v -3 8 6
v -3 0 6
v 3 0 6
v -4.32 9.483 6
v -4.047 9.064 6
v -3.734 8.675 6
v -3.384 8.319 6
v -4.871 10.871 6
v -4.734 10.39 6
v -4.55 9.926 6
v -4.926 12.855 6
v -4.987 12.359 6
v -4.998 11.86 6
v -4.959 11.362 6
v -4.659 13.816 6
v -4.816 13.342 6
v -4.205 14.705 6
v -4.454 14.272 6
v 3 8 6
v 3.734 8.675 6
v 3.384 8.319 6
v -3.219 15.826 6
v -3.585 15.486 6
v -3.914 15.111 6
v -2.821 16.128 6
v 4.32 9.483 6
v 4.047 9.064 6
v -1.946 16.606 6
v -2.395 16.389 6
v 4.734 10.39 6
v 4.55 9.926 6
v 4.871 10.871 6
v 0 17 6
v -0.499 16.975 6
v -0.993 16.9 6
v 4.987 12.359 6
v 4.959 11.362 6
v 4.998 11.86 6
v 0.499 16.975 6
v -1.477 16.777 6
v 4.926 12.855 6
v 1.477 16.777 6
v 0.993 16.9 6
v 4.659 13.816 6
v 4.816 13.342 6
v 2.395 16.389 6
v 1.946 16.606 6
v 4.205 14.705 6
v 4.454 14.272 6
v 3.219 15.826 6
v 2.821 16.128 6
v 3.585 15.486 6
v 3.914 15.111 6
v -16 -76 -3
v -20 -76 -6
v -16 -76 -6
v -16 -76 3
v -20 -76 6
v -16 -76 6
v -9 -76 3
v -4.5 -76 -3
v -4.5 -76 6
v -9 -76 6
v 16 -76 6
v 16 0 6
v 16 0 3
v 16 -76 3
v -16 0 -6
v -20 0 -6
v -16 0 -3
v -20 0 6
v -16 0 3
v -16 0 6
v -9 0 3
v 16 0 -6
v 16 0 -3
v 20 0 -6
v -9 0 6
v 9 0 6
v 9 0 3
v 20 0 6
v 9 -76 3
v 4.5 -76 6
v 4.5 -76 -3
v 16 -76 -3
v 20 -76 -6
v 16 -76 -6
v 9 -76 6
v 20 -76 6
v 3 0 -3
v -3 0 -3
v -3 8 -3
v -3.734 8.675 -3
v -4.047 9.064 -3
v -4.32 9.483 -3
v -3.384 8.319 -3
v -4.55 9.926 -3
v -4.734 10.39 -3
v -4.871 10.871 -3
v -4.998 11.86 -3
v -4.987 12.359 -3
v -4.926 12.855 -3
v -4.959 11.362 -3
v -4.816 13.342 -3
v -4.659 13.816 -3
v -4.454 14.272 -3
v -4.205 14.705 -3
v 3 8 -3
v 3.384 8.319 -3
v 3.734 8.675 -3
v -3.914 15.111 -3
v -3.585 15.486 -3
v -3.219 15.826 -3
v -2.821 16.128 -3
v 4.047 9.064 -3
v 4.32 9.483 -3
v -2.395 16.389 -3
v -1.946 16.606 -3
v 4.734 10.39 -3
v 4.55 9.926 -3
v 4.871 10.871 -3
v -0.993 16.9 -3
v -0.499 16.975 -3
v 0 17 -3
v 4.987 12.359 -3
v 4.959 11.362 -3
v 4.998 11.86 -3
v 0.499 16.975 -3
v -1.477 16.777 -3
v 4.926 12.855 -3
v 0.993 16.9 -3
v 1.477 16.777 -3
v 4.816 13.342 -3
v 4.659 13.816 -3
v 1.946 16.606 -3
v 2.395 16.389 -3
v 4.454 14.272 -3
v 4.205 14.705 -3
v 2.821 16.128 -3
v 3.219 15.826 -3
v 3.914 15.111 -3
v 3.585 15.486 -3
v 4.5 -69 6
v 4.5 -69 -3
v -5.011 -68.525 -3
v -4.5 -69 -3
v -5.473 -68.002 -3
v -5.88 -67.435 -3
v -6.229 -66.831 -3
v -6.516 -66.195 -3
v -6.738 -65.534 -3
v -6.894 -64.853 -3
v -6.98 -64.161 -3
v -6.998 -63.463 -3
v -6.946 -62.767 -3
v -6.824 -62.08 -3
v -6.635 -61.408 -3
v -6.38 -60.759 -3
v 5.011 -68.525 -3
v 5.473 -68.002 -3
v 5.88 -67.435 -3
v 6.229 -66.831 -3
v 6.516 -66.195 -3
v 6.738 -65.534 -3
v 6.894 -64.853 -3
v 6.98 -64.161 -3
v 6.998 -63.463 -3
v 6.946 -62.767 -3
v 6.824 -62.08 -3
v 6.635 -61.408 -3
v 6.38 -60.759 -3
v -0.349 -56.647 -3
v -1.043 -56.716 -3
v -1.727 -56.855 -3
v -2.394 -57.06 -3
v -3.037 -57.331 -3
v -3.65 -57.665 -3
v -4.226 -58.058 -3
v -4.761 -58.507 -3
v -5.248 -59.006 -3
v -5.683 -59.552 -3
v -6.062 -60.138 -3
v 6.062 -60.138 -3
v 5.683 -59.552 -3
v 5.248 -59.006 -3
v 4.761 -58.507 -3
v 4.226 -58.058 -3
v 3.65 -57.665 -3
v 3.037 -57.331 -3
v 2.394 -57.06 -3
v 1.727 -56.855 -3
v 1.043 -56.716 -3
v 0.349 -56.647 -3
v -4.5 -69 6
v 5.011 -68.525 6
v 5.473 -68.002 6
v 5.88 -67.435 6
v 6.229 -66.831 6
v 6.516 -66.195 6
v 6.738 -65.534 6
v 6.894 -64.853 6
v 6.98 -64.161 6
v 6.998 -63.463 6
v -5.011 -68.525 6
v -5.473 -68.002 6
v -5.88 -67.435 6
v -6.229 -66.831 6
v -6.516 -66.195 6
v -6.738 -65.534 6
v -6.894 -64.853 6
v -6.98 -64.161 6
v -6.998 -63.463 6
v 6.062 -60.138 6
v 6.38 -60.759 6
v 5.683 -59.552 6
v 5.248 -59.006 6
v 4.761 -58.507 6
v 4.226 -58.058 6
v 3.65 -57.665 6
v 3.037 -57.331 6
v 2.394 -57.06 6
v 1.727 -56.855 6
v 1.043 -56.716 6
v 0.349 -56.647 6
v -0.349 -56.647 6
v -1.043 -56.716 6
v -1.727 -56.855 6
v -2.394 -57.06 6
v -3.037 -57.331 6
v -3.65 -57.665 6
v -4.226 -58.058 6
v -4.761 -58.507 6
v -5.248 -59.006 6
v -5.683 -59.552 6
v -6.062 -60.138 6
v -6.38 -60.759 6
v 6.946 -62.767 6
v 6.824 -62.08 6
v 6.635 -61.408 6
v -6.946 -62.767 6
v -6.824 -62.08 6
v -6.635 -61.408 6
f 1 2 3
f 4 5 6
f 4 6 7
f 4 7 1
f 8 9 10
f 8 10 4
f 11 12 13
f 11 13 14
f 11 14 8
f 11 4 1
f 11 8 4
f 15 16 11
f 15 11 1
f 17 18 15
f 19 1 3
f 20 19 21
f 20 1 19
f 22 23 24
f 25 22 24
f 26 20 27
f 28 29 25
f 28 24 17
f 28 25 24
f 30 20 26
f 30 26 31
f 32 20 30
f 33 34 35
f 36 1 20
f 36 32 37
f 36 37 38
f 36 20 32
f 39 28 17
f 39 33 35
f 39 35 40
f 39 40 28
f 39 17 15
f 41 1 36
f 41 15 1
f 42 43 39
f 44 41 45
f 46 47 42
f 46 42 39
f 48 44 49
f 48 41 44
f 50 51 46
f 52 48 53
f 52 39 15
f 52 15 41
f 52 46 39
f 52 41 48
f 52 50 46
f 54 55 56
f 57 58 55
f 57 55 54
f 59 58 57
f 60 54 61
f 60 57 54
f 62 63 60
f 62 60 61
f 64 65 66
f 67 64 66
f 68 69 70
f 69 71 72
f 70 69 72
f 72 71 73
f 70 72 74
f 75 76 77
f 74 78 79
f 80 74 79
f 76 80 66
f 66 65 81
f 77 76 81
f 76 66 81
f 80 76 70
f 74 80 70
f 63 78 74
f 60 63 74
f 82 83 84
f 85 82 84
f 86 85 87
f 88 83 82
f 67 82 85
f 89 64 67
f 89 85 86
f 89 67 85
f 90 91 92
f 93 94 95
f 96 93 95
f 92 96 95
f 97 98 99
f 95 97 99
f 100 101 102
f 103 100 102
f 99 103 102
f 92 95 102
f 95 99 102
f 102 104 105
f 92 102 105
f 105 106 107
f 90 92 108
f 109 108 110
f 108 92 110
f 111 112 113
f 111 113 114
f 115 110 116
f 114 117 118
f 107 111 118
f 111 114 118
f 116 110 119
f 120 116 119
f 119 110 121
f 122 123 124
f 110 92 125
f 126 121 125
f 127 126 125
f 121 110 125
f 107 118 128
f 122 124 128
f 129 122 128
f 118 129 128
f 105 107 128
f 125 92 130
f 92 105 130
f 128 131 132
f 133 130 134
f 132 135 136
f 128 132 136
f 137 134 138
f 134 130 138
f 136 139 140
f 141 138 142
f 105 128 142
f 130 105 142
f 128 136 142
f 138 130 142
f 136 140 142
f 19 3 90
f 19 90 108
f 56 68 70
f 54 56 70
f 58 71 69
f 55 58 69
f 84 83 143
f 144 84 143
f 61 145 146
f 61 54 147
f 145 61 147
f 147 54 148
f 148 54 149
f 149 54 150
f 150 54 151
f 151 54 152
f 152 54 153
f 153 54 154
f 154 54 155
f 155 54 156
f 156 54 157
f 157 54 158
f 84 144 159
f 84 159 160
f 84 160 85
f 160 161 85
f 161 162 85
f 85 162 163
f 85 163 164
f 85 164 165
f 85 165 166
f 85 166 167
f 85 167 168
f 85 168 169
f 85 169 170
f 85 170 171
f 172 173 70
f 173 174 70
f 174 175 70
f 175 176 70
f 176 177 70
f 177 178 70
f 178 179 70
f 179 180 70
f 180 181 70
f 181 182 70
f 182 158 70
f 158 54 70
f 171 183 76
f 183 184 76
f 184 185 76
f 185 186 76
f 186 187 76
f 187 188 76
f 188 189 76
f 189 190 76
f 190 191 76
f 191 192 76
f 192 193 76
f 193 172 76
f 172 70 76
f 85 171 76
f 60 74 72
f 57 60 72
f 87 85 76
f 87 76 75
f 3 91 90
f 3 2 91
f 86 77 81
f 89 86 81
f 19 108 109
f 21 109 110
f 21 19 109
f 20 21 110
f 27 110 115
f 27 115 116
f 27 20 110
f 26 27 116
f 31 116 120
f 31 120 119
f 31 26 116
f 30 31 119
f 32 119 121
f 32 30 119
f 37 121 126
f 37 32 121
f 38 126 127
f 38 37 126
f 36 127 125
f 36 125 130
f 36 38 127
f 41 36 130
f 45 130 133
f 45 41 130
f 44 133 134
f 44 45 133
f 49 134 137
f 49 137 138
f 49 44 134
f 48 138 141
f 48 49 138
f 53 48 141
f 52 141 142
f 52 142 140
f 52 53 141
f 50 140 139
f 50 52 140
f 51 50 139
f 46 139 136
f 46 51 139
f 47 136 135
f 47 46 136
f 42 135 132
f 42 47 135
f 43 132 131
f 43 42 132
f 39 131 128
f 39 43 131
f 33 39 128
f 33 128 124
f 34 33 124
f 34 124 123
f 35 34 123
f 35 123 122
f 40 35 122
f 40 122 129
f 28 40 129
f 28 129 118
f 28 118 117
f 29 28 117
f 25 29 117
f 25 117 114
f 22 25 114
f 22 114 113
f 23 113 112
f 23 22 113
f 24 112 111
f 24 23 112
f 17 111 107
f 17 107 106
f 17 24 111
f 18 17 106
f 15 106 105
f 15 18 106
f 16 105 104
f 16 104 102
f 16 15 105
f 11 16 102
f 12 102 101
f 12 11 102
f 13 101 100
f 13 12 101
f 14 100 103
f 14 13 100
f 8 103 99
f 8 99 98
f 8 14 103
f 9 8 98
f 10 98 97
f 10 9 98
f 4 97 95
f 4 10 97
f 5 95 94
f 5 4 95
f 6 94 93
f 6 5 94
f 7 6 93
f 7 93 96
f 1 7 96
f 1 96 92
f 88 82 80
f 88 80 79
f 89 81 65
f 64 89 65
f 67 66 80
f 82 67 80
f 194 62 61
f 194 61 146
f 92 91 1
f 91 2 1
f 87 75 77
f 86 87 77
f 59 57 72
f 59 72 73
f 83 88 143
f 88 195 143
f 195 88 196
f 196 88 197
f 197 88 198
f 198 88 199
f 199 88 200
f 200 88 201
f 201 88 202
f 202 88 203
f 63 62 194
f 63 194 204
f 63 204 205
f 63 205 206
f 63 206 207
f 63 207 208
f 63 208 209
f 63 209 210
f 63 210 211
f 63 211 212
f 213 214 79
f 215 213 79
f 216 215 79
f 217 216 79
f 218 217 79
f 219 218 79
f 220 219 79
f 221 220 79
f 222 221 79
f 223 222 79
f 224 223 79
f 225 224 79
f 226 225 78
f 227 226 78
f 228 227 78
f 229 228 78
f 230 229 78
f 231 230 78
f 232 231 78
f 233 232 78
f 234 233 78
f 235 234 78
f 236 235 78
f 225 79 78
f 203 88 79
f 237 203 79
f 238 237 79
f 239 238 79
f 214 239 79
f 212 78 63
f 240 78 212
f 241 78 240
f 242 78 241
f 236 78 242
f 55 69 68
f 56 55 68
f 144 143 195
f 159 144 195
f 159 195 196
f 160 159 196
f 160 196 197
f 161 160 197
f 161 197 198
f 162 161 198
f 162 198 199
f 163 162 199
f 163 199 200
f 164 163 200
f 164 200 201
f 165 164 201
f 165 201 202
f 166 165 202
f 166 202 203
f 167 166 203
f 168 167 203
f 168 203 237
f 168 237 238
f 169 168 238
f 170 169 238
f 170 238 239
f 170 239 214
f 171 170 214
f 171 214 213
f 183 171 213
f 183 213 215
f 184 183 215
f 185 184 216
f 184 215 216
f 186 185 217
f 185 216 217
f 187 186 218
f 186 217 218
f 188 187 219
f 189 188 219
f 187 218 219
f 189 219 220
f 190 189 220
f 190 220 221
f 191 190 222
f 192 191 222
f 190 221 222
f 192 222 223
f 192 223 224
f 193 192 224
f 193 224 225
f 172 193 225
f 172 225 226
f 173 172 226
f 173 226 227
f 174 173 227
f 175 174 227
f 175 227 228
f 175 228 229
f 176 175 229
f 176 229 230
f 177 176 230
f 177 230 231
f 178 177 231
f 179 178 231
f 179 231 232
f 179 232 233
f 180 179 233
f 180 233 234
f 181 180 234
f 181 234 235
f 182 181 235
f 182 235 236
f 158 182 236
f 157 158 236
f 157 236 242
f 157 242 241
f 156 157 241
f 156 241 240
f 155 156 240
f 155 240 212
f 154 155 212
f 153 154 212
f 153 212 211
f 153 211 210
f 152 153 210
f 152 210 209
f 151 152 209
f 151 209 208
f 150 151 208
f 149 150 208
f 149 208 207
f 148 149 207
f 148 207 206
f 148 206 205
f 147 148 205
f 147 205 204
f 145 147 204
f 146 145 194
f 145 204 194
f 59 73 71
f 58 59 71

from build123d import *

# Parameters (mm, degrees)
PAD_DEPTH         = 76
POCKET_DEPTH      = 12.001
PAD001_DEPTH      = 6
PAD001_DEPTH_BACK = 3


with BuildPart() as body:
    # Sketch → Pad (new body)
    with BuildSketch(Plane.XZ):
        Polygon((-20, 6), (-20, -6), (-16, -6), (-16, -3), (-9, -3), (9, -3), (16, -3), (16, -6), (20, -6), (20, 6), (16, 6), (16, 3), (9, 3), (9, 6), (-9, 6), (-9, 3), (-16, 3), (-16, 6), align=None)
    extrude(amount=PAD_DEPTH)

    # Sketch002 (on Face14 of Pad) → Pocket (cut, through all)
    with BuildSketch(Plane(origin=(0, 0, 6), x_dir=(-1, 0, 0), z_dir=(0, 0, 1))):
        with BuildLine():
            Line((-4.5, 76), (4.5, 76))
            Line((4.5, 76), (4.5, 69))
            ThreePointArc((-4.5, 69), (0, 56.638097), (4.5, 69))
            Line((-4.5, 76), (-4.5, 69))
        make_face()
    extrude(amount=-POCKET_DEPTH, mode=Mode.SUBTRACT)


with BuildPart() as body001:
    # Sketch001 → Pad001 (new body, two sides)
    with BuildSketch(Plane.XY) as pad001_sk:
        with BuildLine():
            Line((-3, 0), (3, 0))
            Line((3, 0), (3, 8))
            ThreePointArc((3, 8), (0, 17), (-3, 8))
            Line((-3, 0), (-3, 8))
        make_face()
    extrude(amount=PAD001_DEPTH)
    extrude(pad001_sk.sketch, amount=-PAD001_DEPTH_BACK)


solid = Compound([body.part, body001.part])
